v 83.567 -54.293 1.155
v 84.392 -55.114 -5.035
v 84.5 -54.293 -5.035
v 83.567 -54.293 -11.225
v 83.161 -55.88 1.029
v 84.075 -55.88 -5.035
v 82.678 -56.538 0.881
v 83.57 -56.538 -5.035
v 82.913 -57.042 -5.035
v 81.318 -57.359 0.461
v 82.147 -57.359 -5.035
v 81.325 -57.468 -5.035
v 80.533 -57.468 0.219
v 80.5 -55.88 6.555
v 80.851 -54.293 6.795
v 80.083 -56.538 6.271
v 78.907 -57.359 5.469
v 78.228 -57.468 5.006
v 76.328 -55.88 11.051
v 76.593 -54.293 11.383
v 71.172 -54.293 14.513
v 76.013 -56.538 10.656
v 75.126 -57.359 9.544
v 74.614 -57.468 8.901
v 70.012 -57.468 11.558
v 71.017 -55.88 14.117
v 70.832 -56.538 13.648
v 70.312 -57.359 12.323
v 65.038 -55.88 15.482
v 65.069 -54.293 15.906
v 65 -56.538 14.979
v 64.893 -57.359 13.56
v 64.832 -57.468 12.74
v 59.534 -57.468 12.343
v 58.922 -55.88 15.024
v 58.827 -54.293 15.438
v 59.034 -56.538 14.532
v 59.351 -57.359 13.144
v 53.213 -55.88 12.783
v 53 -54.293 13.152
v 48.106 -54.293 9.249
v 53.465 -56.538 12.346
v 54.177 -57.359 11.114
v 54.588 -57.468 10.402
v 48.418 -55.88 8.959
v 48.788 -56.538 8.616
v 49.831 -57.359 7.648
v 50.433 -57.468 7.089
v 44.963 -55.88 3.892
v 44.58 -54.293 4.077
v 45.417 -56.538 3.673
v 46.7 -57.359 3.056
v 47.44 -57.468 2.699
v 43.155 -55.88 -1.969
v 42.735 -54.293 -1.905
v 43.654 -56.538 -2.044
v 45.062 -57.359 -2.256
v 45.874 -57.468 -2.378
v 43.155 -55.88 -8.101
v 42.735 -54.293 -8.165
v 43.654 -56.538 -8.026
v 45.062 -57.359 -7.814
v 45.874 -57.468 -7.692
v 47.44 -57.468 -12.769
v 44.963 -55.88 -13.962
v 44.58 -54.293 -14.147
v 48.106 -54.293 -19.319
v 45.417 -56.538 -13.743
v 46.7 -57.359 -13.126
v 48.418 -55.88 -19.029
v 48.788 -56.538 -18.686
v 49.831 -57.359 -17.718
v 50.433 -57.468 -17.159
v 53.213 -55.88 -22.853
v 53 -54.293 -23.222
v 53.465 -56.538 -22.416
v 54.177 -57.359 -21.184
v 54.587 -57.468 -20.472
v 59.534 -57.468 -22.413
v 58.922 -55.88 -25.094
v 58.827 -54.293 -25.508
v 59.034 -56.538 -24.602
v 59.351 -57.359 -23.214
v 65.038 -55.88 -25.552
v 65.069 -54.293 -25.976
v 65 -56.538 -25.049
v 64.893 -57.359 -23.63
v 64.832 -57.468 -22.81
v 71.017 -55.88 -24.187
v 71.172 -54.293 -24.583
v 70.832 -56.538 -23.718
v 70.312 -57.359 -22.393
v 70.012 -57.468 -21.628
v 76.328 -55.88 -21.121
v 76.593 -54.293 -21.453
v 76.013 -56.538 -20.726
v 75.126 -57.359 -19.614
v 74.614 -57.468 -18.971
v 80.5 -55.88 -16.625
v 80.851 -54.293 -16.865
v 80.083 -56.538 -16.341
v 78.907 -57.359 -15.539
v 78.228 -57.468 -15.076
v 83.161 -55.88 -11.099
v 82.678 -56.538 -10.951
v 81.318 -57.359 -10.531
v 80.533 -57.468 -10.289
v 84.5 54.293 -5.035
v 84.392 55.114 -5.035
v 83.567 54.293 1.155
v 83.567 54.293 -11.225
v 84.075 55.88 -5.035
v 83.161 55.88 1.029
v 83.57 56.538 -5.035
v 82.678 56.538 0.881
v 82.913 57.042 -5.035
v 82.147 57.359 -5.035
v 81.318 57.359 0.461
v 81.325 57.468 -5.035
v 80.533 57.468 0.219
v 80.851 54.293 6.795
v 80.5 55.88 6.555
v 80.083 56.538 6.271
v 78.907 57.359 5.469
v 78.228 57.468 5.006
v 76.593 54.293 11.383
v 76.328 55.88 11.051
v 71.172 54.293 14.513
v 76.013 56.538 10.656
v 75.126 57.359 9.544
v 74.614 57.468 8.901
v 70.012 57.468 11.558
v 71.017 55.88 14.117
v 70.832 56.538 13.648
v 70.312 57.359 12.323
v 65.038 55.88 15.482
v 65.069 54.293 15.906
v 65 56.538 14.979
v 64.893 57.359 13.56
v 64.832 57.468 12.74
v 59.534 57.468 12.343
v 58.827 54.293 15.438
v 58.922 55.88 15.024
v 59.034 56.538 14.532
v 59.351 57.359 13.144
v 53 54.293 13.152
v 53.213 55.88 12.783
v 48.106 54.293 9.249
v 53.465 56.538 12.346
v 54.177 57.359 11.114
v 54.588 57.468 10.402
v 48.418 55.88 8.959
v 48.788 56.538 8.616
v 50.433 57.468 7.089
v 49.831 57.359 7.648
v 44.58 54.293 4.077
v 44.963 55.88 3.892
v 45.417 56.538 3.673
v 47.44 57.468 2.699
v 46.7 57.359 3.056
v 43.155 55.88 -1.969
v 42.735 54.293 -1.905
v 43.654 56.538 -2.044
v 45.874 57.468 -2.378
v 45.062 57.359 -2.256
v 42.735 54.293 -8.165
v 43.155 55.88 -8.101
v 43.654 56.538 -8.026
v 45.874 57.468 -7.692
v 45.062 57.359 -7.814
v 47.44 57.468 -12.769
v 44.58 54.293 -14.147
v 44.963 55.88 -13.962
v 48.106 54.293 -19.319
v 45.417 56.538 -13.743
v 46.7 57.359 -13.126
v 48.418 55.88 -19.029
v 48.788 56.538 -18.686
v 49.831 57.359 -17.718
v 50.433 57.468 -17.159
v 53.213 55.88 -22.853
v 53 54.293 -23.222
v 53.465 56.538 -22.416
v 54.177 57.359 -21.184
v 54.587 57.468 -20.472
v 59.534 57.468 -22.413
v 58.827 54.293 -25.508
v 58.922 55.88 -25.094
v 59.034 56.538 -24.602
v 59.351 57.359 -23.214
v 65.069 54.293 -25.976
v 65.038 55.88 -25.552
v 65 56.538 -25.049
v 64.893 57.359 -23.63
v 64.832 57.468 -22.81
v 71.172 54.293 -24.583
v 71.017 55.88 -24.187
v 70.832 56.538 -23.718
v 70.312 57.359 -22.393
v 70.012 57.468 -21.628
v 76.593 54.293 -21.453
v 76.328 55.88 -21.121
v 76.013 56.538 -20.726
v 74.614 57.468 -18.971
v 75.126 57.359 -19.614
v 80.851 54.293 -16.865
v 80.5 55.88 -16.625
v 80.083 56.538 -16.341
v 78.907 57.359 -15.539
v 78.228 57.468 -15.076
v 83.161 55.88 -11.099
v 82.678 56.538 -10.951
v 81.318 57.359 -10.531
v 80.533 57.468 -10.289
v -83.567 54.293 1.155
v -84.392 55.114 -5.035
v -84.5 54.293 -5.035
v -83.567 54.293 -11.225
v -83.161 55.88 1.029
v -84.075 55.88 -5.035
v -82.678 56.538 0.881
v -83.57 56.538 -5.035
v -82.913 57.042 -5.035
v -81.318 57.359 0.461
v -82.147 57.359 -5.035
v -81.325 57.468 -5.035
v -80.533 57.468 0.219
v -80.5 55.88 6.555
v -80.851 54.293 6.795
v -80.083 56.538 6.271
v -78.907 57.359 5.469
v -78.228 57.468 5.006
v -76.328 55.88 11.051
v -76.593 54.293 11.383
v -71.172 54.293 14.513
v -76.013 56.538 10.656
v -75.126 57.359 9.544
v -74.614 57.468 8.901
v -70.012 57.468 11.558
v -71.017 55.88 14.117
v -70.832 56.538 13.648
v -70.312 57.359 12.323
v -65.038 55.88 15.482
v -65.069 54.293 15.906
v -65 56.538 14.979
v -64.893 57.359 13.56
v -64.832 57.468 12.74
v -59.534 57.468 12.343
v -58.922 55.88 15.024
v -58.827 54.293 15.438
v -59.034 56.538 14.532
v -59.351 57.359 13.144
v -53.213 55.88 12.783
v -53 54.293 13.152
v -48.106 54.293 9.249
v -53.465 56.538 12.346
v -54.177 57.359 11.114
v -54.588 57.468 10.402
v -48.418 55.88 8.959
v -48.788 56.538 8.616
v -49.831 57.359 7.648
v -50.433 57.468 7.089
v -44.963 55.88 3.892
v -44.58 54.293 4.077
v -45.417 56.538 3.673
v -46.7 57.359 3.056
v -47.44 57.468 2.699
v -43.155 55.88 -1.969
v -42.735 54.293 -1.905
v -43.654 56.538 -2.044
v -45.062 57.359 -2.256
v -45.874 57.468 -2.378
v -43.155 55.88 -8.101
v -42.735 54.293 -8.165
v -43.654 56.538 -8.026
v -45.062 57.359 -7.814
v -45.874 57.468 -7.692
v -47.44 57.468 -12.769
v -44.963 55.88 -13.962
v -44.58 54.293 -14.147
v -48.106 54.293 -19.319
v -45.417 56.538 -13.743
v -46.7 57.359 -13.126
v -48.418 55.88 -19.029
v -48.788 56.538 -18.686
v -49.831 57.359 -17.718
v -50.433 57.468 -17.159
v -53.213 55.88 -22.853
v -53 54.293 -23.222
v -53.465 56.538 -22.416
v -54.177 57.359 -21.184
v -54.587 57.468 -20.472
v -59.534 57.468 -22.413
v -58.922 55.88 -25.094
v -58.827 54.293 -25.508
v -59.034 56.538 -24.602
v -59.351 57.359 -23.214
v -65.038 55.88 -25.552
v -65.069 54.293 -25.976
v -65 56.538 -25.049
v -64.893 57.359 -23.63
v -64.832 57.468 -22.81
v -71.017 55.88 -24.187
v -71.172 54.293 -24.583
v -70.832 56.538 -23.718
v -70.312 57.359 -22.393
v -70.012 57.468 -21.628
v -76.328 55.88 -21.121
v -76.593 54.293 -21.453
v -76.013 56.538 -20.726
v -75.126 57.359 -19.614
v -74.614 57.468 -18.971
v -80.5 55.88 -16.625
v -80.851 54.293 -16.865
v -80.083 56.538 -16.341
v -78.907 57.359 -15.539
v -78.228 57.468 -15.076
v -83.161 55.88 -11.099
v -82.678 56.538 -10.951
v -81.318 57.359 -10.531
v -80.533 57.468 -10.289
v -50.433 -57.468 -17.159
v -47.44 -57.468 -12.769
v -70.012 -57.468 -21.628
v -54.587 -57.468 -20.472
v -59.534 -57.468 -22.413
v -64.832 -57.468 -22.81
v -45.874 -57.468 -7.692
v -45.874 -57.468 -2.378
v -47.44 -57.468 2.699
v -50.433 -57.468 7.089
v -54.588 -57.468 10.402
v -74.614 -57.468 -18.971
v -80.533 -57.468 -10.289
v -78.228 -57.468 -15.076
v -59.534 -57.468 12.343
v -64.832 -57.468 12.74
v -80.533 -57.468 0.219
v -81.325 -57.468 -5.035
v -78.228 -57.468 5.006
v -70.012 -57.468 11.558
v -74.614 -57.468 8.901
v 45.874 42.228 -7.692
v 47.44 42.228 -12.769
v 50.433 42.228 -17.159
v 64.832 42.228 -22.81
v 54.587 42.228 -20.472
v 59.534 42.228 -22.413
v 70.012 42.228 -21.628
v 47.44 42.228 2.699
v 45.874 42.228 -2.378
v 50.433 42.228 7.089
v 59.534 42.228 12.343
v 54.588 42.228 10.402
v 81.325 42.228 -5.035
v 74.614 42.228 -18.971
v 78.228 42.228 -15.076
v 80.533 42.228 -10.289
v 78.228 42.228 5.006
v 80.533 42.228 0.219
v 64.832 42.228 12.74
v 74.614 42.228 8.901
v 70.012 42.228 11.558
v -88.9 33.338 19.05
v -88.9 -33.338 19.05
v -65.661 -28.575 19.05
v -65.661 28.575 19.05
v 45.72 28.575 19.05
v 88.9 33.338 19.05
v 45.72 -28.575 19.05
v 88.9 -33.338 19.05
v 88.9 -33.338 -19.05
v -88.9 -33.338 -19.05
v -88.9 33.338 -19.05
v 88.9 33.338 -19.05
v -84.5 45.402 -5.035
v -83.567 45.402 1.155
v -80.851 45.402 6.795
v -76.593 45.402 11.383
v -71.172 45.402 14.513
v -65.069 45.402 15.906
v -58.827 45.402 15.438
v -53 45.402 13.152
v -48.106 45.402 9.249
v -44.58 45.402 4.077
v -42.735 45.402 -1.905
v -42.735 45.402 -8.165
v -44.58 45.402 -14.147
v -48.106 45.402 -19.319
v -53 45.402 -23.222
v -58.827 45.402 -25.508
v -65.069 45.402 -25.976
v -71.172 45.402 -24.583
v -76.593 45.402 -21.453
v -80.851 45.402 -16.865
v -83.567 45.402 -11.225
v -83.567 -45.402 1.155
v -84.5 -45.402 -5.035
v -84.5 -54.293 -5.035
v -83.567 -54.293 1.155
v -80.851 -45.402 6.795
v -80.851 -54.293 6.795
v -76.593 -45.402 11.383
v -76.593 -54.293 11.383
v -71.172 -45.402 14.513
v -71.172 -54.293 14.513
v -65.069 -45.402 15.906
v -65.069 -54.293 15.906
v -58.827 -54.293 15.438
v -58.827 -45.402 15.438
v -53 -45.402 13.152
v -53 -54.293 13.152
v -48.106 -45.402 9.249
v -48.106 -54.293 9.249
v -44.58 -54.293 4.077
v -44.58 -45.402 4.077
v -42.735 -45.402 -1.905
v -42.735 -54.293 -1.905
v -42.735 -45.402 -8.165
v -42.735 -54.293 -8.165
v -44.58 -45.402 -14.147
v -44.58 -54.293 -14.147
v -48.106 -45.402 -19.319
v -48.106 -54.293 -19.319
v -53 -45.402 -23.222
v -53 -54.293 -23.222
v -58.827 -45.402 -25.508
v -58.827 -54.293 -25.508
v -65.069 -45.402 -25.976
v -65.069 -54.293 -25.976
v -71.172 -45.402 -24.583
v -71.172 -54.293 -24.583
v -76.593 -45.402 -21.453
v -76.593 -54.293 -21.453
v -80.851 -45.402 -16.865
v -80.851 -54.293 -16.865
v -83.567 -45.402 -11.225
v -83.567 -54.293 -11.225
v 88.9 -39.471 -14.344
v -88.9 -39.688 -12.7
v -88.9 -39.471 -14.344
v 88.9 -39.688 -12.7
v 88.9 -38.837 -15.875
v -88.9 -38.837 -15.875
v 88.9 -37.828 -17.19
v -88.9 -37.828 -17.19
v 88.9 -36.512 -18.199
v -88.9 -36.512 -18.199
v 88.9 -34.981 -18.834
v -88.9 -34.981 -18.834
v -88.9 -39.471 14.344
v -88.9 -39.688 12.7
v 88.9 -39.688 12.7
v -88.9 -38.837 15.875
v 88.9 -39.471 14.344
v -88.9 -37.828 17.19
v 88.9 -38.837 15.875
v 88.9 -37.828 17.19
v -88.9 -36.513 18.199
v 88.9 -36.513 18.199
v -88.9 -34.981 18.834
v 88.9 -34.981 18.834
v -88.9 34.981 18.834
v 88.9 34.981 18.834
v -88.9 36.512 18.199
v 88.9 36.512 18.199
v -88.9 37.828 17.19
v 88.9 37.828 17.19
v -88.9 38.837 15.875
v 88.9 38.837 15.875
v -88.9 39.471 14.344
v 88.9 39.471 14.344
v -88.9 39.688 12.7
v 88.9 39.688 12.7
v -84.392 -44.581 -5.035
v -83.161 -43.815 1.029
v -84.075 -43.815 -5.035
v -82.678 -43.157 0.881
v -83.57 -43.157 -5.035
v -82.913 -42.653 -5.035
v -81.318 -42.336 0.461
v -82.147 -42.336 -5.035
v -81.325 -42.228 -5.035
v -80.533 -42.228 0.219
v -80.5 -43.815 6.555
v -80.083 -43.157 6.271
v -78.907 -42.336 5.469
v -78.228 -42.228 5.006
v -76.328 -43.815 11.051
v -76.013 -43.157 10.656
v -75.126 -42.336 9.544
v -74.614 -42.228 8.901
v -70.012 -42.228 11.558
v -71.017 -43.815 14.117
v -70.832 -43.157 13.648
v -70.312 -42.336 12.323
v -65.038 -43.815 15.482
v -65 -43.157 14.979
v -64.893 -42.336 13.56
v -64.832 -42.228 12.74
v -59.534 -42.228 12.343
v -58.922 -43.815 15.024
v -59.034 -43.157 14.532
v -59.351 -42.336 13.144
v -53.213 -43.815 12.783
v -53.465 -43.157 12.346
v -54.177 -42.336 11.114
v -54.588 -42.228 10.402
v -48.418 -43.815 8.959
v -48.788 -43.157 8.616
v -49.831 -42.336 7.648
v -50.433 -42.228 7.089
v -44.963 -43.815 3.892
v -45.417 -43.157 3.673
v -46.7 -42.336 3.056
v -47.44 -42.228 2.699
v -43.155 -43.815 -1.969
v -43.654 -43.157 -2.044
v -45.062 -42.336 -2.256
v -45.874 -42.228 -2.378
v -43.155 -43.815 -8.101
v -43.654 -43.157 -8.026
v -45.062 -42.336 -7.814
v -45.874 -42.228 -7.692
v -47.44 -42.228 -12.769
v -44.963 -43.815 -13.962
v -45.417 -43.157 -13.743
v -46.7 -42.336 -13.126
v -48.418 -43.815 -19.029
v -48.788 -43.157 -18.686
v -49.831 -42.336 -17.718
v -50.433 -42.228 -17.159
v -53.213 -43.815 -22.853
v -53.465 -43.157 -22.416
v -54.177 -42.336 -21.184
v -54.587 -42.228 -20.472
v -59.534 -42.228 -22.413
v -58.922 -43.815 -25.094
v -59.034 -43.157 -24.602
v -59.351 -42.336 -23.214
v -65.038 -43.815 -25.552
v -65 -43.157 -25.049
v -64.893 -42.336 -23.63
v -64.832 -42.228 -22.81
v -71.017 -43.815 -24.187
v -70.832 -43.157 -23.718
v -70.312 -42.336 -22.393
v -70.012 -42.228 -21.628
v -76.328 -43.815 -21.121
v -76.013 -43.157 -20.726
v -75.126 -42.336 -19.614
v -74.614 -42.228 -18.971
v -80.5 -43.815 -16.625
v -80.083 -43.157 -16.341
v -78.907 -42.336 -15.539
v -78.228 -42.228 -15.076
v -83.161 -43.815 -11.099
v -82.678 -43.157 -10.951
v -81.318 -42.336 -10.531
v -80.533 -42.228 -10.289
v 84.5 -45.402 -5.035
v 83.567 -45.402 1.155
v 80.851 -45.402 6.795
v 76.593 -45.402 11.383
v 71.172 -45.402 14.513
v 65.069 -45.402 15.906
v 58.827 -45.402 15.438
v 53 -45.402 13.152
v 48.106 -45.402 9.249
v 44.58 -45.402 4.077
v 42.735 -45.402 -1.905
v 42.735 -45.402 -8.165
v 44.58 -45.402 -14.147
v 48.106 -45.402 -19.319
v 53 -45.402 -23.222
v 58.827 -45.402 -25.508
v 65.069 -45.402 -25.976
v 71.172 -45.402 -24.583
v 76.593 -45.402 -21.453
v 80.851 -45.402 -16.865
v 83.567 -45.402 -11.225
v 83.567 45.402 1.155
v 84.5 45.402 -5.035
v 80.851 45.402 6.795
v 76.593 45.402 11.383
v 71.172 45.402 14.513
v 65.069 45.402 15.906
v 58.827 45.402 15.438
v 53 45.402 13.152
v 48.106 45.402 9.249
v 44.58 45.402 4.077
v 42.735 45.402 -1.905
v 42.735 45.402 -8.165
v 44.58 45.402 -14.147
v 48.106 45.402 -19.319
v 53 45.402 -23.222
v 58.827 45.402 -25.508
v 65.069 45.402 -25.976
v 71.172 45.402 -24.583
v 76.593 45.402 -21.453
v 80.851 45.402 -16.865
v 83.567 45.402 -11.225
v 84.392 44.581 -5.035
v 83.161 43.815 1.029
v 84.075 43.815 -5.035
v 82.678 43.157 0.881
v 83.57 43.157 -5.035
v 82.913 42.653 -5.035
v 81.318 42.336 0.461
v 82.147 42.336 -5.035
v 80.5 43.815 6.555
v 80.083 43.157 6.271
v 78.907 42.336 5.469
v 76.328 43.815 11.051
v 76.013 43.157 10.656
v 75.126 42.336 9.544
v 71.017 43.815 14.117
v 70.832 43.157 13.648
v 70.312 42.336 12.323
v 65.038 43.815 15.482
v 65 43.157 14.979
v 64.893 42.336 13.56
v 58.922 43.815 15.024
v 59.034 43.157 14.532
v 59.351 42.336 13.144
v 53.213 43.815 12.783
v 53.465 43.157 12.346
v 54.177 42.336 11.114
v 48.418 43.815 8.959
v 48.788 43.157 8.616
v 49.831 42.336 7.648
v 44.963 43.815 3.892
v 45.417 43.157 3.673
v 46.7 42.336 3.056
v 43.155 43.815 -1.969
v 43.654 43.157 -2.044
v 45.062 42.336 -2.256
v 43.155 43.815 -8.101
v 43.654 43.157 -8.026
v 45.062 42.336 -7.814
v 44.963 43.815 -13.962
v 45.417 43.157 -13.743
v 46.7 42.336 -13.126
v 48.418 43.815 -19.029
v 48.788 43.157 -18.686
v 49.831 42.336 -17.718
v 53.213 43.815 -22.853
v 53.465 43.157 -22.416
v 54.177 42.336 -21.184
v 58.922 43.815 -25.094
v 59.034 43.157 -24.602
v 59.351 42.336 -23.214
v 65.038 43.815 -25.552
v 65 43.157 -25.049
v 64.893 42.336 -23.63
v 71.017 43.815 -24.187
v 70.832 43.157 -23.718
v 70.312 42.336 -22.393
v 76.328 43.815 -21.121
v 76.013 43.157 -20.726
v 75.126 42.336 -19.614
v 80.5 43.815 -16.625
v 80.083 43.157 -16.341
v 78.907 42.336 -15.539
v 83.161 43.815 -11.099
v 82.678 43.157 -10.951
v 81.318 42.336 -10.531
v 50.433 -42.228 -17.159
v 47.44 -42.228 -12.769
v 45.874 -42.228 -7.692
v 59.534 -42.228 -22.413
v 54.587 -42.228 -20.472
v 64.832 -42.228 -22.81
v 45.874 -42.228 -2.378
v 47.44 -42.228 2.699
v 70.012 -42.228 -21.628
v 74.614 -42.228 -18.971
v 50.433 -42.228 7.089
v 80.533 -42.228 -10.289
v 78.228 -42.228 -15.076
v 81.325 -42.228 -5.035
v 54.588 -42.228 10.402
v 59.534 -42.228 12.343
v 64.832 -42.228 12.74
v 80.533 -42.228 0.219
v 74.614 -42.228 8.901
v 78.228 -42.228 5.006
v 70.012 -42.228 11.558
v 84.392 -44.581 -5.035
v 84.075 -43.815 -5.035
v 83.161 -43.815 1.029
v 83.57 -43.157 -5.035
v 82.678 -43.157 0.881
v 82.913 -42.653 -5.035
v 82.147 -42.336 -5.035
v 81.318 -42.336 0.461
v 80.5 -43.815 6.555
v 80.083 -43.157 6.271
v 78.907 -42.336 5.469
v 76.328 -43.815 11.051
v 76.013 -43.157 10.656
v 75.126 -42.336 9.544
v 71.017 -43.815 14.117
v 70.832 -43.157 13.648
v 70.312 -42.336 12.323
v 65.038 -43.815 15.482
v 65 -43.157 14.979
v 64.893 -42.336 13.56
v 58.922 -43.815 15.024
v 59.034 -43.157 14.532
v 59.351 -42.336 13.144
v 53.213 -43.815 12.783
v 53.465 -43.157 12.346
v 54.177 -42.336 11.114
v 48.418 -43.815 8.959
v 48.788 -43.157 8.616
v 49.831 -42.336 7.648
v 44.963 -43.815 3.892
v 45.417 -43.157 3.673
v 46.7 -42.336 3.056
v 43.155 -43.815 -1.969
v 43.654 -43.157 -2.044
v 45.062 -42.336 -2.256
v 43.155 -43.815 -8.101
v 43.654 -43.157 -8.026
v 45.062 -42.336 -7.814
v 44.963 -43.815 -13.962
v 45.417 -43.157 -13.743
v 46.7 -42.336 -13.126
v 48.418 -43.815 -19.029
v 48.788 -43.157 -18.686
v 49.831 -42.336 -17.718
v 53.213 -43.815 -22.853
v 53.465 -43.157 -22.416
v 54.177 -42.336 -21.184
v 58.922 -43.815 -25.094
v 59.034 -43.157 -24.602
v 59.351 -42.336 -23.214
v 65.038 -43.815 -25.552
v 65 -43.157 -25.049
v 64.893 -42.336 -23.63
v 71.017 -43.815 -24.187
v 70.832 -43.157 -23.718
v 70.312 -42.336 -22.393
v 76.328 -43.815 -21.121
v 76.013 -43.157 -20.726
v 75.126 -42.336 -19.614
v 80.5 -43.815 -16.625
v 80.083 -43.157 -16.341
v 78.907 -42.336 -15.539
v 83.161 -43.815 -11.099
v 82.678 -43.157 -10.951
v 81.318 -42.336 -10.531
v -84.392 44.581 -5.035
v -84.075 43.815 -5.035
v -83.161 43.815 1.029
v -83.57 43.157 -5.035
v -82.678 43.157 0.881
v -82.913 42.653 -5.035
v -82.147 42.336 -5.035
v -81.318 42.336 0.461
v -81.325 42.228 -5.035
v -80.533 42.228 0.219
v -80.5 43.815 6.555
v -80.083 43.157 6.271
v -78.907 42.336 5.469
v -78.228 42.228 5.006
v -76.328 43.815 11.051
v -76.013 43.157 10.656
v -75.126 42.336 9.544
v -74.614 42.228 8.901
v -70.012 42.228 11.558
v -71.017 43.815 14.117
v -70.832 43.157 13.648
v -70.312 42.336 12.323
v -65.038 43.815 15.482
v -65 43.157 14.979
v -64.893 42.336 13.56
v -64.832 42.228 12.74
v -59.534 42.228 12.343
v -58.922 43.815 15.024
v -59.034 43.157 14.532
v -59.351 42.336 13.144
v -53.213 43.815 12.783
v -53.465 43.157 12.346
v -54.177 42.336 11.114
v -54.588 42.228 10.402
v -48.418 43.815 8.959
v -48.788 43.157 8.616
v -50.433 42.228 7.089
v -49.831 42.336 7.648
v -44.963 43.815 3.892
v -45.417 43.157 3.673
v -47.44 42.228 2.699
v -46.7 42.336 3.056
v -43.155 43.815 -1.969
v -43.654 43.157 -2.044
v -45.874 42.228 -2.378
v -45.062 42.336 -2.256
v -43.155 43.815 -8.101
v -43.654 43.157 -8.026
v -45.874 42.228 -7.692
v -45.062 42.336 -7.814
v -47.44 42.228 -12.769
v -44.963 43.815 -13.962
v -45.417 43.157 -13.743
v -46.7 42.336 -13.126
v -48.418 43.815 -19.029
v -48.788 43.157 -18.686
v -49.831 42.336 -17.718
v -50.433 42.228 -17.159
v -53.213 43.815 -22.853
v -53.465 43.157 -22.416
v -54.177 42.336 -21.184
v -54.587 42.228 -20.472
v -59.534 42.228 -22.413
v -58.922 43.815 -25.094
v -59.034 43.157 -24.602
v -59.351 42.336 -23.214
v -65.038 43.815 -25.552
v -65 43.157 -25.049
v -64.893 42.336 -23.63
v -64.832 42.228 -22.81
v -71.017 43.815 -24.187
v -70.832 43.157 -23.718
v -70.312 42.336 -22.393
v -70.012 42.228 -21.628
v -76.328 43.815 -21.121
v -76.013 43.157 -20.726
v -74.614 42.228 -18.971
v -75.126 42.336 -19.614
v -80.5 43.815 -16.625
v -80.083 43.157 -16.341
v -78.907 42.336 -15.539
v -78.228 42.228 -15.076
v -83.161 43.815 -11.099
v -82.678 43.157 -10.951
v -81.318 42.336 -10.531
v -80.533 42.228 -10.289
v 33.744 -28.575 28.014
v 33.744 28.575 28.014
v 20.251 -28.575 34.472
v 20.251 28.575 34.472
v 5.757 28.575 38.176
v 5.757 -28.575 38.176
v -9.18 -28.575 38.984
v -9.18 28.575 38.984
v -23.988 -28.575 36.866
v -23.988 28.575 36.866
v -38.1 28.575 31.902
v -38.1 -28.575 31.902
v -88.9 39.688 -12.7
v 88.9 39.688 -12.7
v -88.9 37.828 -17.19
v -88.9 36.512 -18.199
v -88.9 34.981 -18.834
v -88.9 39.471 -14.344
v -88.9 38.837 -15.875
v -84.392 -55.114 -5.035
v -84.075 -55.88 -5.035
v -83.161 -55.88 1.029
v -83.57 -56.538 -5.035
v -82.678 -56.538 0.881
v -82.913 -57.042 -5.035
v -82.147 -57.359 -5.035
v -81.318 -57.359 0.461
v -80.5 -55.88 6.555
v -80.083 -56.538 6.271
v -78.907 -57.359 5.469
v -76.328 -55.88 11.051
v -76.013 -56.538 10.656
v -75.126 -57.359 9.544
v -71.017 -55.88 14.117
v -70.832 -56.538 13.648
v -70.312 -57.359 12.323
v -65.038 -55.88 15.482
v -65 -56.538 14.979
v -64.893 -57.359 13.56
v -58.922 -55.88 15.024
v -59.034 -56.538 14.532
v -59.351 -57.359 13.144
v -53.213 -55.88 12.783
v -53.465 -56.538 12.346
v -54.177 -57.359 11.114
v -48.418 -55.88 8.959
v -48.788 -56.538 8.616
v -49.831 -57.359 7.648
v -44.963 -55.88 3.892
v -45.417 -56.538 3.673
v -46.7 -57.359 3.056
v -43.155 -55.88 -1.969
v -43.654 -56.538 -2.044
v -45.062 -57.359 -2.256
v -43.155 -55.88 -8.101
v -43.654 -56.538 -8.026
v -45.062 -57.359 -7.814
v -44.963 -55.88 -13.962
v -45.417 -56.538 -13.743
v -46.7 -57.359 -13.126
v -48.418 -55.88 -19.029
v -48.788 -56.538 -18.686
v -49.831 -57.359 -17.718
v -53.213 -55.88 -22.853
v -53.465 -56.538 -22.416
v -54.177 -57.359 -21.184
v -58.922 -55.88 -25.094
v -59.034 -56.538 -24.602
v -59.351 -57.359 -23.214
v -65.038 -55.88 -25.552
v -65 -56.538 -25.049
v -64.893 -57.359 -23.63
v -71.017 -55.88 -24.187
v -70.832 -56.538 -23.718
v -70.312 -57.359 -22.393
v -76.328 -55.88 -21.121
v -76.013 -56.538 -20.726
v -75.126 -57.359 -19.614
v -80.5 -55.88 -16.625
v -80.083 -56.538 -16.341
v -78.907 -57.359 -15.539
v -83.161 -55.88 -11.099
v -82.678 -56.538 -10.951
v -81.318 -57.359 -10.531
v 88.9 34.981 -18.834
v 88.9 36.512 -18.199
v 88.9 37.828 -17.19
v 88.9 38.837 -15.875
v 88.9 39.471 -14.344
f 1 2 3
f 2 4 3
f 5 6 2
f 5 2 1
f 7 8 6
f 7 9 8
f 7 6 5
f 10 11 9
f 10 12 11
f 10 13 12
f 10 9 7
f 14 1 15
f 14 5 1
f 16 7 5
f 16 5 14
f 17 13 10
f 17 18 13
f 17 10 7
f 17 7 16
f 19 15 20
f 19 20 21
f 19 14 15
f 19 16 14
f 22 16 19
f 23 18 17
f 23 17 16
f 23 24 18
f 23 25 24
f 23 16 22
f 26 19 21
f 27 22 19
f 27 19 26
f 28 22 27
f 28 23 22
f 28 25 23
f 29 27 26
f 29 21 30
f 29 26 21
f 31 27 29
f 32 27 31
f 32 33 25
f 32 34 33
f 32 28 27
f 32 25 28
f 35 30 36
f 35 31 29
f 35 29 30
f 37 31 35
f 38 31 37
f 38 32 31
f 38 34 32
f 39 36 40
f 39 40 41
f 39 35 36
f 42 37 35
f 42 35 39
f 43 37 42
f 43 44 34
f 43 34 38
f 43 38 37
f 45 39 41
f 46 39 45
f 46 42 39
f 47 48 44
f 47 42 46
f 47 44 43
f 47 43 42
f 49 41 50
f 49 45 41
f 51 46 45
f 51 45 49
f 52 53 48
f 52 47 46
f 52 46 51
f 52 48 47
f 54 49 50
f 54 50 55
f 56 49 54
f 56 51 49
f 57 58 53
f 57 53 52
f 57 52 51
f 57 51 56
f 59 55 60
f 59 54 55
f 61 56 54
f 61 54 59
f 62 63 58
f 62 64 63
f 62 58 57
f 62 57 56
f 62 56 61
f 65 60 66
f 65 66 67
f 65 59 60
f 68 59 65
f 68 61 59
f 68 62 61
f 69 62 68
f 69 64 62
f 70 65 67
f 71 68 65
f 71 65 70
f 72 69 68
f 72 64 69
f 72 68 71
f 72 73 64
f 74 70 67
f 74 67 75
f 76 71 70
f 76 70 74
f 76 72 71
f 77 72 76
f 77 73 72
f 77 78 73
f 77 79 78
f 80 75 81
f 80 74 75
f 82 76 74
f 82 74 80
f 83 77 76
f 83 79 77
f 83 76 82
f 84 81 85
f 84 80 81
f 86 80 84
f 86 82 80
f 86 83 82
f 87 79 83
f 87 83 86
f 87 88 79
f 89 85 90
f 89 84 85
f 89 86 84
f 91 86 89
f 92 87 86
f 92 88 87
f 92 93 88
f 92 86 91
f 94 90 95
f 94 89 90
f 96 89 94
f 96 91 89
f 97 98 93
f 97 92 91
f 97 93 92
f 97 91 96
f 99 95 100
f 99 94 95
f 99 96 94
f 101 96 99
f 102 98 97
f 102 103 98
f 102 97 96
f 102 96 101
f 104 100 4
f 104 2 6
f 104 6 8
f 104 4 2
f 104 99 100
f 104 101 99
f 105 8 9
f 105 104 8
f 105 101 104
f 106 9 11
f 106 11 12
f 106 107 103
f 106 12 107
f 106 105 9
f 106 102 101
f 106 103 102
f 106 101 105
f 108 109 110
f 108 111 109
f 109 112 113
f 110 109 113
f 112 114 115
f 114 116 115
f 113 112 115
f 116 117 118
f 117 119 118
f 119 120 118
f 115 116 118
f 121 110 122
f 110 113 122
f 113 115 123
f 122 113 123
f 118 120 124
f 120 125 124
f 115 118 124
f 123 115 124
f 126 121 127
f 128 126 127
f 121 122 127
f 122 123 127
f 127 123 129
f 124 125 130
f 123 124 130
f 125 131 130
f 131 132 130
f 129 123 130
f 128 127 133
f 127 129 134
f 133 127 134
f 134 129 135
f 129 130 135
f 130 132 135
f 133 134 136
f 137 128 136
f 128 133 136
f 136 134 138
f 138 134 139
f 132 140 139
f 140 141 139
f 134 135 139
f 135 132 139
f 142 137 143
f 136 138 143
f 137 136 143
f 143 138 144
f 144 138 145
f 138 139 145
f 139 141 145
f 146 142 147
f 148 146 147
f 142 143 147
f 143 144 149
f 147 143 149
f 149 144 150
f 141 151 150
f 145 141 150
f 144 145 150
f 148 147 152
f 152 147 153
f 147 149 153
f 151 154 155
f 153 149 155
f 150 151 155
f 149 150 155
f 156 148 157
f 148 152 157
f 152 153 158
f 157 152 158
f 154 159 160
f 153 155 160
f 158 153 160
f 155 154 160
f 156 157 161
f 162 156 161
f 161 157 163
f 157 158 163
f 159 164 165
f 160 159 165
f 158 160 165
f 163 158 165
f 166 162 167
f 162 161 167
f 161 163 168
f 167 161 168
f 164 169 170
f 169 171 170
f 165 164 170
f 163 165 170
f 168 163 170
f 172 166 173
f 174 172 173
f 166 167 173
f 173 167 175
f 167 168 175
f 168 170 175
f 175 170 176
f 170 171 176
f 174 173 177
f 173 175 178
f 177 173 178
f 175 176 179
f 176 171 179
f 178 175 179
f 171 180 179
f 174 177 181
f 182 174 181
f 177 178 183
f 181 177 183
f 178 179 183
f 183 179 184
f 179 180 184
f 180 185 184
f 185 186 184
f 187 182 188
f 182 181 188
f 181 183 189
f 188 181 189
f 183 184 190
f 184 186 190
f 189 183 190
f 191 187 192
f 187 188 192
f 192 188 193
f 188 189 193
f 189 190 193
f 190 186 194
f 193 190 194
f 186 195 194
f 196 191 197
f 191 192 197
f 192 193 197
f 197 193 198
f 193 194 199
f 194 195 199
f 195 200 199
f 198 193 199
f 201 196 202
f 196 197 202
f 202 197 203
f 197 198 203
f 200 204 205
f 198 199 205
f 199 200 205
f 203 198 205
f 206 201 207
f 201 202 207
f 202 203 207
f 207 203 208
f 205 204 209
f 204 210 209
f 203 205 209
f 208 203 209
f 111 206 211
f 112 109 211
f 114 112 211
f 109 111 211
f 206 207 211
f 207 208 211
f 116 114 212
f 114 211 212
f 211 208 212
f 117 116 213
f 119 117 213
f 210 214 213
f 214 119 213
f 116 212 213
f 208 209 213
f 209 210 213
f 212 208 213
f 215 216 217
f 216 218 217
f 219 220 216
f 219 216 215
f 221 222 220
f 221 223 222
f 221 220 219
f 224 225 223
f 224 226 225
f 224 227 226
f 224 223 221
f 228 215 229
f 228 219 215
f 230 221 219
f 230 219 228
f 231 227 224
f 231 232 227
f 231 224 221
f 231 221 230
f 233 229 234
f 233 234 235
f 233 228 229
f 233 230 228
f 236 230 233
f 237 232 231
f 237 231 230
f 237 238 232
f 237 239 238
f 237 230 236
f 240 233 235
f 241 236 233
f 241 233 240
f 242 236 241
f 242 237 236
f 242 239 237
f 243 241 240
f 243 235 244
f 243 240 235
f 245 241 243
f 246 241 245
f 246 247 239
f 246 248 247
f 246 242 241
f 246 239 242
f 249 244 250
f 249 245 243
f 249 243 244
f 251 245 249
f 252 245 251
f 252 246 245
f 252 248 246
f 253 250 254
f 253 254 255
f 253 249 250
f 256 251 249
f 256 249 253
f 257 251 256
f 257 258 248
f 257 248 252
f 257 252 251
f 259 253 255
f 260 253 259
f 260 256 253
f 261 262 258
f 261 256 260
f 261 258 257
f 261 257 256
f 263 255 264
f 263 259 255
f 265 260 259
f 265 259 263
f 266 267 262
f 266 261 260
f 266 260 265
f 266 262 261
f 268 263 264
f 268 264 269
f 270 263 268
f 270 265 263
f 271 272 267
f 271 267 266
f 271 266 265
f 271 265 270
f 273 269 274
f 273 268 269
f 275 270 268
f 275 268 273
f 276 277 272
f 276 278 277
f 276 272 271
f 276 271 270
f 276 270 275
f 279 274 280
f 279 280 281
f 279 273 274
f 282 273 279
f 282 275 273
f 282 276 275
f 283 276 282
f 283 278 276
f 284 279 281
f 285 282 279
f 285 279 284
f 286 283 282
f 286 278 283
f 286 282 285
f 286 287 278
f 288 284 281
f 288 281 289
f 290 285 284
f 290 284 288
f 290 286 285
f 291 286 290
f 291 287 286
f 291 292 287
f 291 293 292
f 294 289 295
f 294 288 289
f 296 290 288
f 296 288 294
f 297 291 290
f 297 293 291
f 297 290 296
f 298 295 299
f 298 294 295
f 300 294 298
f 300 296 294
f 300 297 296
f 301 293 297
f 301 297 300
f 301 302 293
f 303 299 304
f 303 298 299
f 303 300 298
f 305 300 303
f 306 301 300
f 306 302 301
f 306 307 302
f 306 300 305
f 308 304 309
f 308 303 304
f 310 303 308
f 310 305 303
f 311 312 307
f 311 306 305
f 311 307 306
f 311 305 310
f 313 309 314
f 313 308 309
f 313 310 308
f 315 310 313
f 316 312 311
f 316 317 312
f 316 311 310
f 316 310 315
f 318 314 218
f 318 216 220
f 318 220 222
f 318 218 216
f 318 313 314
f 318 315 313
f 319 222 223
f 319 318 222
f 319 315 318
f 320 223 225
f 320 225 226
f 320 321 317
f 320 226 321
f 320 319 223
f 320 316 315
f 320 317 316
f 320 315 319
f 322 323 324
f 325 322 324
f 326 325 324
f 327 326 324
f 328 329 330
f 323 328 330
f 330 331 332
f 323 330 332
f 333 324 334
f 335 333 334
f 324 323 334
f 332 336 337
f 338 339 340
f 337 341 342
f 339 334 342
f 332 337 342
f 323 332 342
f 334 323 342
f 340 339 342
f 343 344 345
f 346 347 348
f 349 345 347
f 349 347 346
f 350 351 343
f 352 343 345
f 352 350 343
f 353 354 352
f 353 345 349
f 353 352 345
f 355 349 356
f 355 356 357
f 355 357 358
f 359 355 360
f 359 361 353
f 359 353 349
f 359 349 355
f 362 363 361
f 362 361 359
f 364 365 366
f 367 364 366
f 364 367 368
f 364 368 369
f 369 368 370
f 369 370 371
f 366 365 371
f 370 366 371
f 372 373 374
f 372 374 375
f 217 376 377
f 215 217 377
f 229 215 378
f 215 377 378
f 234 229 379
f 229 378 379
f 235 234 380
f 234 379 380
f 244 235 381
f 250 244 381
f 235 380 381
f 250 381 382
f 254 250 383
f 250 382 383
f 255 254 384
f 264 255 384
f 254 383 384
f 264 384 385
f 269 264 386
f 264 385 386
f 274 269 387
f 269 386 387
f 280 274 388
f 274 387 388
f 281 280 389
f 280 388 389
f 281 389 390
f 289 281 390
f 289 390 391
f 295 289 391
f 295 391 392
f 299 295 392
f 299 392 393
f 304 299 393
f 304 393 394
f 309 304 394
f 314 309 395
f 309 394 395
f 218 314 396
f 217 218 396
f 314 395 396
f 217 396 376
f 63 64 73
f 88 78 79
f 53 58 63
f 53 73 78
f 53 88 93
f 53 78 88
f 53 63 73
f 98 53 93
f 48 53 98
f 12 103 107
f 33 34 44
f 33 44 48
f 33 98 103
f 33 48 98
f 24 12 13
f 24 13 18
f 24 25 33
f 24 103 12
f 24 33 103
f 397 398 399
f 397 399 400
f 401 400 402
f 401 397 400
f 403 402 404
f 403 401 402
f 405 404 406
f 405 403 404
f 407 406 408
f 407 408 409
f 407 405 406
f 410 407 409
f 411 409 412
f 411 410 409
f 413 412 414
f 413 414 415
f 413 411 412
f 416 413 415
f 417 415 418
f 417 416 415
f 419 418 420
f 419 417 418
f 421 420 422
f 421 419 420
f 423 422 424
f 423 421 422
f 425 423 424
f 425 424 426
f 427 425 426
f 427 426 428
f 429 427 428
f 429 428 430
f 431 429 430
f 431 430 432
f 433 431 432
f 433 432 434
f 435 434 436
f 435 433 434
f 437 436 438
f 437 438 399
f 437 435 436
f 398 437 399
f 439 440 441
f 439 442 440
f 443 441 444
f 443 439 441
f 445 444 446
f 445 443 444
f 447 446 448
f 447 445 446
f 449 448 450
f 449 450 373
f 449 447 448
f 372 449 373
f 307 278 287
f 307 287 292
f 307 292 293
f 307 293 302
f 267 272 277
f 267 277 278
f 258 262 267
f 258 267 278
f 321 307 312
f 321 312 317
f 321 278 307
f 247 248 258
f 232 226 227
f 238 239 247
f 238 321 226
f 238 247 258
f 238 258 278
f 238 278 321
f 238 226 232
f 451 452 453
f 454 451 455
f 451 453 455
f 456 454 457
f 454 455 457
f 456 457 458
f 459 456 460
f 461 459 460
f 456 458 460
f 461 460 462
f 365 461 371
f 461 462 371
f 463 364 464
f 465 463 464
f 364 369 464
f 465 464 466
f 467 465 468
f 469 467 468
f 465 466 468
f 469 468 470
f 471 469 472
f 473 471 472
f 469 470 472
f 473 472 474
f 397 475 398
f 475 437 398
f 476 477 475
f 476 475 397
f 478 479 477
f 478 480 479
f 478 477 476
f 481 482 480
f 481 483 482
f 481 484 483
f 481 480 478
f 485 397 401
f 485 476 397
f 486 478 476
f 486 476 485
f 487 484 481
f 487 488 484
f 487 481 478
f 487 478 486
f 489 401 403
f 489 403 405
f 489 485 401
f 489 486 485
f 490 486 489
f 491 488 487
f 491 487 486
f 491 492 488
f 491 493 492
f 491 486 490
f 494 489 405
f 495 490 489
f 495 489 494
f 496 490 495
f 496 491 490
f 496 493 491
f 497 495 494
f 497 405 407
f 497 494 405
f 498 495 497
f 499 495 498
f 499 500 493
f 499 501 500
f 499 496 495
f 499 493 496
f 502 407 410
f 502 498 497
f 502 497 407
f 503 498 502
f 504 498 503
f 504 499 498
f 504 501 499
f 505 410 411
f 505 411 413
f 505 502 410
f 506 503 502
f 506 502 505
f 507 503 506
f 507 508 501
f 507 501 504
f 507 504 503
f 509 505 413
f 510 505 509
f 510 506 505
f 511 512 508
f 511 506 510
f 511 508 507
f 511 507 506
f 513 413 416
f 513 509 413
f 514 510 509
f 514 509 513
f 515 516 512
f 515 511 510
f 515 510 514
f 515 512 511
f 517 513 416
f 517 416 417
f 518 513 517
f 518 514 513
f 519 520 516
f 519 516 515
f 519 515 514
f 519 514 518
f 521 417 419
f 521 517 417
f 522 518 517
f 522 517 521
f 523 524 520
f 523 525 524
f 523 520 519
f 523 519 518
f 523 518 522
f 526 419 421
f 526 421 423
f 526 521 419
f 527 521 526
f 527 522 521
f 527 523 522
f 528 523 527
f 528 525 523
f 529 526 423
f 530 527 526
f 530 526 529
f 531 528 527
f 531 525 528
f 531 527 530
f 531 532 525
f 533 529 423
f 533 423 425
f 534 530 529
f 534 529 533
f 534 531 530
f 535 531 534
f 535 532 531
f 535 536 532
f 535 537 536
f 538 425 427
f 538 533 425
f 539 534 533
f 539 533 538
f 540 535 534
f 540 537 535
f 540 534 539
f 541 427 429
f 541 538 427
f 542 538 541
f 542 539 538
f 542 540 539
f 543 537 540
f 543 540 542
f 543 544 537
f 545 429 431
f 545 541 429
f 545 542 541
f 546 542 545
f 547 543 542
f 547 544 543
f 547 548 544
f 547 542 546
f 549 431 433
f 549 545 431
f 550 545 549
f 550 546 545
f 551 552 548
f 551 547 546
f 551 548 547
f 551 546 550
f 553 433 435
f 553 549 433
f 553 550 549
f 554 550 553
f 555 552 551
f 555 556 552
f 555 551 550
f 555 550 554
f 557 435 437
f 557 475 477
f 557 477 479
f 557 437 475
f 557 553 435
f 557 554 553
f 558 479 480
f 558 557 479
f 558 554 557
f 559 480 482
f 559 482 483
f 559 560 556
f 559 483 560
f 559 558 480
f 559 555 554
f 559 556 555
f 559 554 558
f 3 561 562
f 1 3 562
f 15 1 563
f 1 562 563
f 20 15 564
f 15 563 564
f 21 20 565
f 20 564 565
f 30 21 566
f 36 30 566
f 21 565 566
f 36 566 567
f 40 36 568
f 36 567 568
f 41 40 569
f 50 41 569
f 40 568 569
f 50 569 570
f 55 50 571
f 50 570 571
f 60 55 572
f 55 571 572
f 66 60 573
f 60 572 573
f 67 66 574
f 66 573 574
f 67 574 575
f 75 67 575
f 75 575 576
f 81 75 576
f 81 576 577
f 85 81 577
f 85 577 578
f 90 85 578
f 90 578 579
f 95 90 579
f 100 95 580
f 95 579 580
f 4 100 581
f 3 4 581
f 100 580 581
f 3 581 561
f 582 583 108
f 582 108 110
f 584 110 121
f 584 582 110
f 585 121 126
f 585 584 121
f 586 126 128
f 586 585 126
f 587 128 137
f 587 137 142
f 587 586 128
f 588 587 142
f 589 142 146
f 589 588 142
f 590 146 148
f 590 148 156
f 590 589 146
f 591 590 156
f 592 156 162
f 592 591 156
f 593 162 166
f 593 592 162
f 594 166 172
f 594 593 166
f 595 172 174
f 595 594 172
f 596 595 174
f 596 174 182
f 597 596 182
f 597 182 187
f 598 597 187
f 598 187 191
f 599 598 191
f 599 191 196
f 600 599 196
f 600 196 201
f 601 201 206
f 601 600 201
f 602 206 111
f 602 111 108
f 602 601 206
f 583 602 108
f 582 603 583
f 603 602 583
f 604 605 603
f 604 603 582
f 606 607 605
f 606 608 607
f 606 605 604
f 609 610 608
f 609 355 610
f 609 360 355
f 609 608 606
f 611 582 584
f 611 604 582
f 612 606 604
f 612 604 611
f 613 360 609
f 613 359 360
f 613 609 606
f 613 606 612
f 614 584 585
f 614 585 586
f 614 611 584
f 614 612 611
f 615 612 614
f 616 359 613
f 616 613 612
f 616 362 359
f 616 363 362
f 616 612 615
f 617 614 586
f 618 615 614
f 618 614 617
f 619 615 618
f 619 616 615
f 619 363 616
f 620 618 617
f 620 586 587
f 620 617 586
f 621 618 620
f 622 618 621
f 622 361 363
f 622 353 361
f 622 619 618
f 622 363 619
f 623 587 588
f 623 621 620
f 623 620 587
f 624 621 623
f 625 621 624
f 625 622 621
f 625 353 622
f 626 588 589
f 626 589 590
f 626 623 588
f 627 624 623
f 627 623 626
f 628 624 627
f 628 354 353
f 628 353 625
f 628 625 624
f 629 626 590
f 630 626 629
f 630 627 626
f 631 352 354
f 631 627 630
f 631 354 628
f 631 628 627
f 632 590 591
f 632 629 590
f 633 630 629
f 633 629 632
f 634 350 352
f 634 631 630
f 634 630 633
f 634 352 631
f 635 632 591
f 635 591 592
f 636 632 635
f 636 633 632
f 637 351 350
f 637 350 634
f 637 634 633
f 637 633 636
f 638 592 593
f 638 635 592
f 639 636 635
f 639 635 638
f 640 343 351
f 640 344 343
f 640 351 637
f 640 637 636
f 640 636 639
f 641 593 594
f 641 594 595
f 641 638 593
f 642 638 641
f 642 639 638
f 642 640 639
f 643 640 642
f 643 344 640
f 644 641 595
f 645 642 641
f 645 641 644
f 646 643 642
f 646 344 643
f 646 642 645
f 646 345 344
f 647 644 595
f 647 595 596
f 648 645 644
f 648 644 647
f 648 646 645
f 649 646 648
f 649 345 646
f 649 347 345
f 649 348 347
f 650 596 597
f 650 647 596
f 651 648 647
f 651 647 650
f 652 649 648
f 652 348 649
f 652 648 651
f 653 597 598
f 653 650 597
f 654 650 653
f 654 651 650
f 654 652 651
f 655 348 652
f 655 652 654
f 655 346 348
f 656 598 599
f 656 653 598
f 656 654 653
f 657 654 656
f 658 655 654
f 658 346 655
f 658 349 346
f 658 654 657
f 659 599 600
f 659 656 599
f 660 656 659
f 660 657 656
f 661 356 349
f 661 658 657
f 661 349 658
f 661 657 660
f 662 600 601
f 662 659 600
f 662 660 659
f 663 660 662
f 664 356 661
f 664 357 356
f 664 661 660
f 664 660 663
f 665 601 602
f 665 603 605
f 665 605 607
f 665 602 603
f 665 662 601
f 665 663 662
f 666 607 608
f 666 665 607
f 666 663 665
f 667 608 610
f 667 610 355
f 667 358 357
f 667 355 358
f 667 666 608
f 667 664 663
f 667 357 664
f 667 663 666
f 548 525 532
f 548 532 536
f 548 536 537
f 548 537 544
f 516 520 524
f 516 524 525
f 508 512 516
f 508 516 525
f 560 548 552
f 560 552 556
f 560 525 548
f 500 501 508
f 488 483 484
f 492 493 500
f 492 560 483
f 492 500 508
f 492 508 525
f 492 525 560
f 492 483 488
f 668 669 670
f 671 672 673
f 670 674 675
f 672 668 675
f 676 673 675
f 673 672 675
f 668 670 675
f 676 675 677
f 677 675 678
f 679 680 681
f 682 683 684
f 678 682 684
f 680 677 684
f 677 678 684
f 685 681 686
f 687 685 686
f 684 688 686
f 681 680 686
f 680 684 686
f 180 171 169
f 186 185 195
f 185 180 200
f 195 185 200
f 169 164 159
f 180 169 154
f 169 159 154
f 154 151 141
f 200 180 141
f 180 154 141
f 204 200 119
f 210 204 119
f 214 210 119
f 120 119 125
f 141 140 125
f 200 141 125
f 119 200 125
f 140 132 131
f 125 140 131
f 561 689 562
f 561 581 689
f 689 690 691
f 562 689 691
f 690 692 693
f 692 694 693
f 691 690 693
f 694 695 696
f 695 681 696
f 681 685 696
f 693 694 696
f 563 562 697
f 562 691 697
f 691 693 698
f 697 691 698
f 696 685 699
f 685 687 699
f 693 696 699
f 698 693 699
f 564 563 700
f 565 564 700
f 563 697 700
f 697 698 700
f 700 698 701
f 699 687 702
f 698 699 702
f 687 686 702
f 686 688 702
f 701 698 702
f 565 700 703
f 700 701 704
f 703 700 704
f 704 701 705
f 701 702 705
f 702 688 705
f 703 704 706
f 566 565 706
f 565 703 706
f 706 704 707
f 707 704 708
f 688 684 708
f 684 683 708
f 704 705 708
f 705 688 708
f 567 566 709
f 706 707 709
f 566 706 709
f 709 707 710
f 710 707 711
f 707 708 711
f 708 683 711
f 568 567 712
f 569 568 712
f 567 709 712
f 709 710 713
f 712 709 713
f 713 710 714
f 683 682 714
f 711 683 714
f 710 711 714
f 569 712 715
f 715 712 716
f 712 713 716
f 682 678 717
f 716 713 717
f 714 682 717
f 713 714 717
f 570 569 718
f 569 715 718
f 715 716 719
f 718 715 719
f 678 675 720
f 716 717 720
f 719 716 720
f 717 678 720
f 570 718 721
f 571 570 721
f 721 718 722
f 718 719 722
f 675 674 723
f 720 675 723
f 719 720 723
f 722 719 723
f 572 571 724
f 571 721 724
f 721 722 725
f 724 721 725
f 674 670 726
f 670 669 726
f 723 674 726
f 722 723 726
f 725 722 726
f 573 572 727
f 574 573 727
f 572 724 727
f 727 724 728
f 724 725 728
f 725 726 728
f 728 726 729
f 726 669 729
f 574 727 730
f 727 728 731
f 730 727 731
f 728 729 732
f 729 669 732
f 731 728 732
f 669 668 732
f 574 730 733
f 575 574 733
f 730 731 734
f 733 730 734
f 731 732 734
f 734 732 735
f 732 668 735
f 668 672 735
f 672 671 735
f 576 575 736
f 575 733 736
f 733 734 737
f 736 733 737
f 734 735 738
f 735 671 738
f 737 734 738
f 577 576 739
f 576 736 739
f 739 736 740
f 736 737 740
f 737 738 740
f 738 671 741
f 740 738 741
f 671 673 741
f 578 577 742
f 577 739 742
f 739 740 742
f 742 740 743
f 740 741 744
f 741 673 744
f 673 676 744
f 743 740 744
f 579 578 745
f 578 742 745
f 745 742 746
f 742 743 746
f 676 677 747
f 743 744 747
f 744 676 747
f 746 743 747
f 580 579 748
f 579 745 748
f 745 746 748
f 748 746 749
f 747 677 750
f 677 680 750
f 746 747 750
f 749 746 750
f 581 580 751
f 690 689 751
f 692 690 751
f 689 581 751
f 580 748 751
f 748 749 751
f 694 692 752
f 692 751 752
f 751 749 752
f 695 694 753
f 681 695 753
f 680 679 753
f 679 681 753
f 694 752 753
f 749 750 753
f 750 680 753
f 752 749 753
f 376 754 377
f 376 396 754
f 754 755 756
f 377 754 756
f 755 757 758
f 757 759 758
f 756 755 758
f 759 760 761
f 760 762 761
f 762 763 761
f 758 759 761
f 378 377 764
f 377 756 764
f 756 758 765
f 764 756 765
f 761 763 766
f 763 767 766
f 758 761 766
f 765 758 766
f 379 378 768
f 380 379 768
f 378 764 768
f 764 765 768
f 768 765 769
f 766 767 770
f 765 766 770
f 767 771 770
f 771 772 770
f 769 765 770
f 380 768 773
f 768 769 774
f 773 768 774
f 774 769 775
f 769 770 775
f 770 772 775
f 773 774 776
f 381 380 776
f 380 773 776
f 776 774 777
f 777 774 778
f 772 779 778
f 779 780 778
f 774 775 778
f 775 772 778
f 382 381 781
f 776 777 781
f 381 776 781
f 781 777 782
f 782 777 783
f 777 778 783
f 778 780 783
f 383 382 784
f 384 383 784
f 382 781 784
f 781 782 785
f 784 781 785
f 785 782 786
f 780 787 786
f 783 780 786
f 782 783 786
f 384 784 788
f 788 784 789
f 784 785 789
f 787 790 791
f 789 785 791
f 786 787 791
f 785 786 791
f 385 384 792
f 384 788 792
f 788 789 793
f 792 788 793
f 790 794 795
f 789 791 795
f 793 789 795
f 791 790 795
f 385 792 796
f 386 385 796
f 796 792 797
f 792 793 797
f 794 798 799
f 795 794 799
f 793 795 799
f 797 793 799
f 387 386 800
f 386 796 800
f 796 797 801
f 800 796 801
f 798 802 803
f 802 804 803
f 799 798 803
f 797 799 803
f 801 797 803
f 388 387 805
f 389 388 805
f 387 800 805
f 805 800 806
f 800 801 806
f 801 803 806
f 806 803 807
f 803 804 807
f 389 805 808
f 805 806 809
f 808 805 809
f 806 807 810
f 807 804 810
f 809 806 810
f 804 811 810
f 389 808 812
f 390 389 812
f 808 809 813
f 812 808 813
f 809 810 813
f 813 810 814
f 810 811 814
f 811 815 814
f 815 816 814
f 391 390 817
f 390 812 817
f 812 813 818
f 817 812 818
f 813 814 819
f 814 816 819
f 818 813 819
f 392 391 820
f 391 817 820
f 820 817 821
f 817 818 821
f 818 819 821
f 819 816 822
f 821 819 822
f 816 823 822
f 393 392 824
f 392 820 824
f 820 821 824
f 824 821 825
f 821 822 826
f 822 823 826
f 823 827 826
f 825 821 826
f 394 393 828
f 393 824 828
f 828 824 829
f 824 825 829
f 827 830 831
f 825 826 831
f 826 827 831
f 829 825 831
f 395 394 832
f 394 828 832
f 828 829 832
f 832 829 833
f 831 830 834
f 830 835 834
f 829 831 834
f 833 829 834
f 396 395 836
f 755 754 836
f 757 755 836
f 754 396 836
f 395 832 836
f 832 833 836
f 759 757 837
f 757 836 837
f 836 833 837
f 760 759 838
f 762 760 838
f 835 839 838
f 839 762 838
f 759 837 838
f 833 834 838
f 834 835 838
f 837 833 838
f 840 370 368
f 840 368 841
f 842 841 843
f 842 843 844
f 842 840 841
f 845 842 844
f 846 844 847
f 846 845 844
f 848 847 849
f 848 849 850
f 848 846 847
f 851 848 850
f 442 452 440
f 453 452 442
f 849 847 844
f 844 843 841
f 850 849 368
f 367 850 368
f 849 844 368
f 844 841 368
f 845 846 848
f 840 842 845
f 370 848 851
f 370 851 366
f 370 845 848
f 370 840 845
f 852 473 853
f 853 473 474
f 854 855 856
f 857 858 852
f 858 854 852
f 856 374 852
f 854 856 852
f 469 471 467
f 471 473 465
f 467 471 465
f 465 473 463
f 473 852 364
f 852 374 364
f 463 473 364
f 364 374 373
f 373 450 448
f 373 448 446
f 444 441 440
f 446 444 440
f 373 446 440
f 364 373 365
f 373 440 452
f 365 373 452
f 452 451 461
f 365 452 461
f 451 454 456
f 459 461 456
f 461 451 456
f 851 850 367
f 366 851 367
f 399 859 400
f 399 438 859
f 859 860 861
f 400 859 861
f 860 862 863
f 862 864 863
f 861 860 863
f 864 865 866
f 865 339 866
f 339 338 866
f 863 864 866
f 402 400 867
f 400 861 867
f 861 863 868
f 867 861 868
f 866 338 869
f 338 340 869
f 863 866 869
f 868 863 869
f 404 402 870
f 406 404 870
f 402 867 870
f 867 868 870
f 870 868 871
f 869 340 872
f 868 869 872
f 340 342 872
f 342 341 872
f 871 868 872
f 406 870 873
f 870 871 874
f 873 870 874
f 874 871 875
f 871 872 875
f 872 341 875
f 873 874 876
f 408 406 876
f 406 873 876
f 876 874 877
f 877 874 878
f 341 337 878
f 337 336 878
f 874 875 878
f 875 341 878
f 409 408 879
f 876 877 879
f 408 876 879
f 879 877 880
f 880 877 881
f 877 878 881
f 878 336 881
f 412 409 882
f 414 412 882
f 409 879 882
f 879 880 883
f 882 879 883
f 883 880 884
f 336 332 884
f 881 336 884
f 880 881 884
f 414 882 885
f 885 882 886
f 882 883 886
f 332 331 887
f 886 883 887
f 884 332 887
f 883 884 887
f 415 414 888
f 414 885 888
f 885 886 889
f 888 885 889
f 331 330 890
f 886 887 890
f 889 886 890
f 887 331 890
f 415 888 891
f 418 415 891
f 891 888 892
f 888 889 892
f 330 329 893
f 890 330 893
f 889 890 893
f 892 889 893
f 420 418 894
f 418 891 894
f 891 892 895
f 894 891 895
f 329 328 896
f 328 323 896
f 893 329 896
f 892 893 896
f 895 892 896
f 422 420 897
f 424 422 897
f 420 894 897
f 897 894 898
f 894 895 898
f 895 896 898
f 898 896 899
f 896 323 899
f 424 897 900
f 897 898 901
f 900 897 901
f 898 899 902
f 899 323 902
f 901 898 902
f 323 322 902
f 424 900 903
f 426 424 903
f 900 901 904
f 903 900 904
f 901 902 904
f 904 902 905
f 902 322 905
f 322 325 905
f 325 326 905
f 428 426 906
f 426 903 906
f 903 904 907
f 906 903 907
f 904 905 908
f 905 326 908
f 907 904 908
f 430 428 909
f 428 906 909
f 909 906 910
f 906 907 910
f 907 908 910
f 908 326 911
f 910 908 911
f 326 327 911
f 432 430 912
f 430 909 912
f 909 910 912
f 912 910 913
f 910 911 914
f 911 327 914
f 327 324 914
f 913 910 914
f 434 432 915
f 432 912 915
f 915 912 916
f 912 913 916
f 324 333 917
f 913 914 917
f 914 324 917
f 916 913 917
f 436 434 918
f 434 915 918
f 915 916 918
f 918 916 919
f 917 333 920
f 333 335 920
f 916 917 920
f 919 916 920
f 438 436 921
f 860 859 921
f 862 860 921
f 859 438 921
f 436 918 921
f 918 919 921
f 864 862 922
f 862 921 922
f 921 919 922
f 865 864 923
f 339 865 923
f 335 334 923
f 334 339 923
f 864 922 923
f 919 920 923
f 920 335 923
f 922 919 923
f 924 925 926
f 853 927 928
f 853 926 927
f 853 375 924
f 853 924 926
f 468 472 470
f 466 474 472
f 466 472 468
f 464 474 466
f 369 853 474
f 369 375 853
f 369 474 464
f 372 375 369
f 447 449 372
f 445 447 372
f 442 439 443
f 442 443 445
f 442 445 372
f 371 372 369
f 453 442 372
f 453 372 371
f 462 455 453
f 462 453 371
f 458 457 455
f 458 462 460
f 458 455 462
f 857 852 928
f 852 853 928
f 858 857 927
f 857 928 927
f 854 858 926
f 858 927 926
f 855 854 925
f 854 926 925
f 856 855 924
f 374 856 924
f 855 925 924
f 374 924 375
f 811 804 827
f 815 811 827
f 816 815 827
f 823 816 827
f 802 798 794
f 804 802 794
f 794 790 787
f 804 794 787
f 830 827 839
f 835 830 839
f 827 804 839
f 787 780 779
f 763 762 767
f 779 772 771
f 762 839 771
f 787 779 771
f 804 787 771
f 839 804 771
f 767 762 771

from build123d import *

# Parameters (mm, degrees)
F1_W      = 177.8
F1_H      = 38.1
F2_DEPTH  = 39.6875
F4_R      = 21
F5_DEPTH  = 15.24
F6_R      = 6.35
F7_R      = 3.175
F11_DEPTH = 28.575


with BuildPart() as f2:
    # F1 (on Front) → F2 (new body, symmetric)
    with BuildSketch(Plane.XZ):
        Rectangle(F1_W, F1_H)
    extrude(amount=F2_DEPTH, both=True)

    # F6
    f6_edges = [f2.edges().sort_by_distance(p)[0] for p in [
        (0, -39.6875, 19.05),
        (0, 39.6875, 19.05),
        (0, -39.6875, -19.05),
        (0, 39.6875, -19.05),
    ]]
    fillet(f6_edges, radius=F6_R)

    # F10 (on Front) → F11 (join, symmetric)
    with BuildSketch(Plane.XZ):
        with BuildLine():
            Line((-65.661006, 19.05), (45.72, 19.05))
            ThreePointArc((45.72, 19.05), (5.757279, 38.176086), (-38.1, 31.901908))
            Line((-38.1, 31.901908), (-65.661006, 19.05))
        make_face()
    extrude(amount=F11_DEPTH, both=True)


with BuildPart() as f5:
    # F4 (on offset) → F5 (new body)
    with BuildSketch(Plane.XZ.offset(42.2275)):
        with Locations((63.5, -5.035)):
            Circle(F4_R)
    extrude(amount=F5_DEPTH)

    # F7
    f7_edges = [f5.edges().sort_by_distance(p)[0] for p in [
        (42.5, -57.4675, -5.035),
        (42.5, -42.2275, -5.035),
    ]]
    fillet(f7_edges, radius=F7_R)


with BuildPart() as f8_1:
    # F8: instance of F5
    add(f5.part.mirror(Plane.YZ))


with BuildPart() as f9_1:
    # F9: instance of F8_1
    add(f8_1.part.mirror(Plane.XZ))


with BuildPart() as f9_2:
    # F9: instance of F5
    add(f5.part.mirror(Plane.XZ))


solid = Compound([f2.part, f5.part, f8_1.part, f9_1.part, f9_2.part])
